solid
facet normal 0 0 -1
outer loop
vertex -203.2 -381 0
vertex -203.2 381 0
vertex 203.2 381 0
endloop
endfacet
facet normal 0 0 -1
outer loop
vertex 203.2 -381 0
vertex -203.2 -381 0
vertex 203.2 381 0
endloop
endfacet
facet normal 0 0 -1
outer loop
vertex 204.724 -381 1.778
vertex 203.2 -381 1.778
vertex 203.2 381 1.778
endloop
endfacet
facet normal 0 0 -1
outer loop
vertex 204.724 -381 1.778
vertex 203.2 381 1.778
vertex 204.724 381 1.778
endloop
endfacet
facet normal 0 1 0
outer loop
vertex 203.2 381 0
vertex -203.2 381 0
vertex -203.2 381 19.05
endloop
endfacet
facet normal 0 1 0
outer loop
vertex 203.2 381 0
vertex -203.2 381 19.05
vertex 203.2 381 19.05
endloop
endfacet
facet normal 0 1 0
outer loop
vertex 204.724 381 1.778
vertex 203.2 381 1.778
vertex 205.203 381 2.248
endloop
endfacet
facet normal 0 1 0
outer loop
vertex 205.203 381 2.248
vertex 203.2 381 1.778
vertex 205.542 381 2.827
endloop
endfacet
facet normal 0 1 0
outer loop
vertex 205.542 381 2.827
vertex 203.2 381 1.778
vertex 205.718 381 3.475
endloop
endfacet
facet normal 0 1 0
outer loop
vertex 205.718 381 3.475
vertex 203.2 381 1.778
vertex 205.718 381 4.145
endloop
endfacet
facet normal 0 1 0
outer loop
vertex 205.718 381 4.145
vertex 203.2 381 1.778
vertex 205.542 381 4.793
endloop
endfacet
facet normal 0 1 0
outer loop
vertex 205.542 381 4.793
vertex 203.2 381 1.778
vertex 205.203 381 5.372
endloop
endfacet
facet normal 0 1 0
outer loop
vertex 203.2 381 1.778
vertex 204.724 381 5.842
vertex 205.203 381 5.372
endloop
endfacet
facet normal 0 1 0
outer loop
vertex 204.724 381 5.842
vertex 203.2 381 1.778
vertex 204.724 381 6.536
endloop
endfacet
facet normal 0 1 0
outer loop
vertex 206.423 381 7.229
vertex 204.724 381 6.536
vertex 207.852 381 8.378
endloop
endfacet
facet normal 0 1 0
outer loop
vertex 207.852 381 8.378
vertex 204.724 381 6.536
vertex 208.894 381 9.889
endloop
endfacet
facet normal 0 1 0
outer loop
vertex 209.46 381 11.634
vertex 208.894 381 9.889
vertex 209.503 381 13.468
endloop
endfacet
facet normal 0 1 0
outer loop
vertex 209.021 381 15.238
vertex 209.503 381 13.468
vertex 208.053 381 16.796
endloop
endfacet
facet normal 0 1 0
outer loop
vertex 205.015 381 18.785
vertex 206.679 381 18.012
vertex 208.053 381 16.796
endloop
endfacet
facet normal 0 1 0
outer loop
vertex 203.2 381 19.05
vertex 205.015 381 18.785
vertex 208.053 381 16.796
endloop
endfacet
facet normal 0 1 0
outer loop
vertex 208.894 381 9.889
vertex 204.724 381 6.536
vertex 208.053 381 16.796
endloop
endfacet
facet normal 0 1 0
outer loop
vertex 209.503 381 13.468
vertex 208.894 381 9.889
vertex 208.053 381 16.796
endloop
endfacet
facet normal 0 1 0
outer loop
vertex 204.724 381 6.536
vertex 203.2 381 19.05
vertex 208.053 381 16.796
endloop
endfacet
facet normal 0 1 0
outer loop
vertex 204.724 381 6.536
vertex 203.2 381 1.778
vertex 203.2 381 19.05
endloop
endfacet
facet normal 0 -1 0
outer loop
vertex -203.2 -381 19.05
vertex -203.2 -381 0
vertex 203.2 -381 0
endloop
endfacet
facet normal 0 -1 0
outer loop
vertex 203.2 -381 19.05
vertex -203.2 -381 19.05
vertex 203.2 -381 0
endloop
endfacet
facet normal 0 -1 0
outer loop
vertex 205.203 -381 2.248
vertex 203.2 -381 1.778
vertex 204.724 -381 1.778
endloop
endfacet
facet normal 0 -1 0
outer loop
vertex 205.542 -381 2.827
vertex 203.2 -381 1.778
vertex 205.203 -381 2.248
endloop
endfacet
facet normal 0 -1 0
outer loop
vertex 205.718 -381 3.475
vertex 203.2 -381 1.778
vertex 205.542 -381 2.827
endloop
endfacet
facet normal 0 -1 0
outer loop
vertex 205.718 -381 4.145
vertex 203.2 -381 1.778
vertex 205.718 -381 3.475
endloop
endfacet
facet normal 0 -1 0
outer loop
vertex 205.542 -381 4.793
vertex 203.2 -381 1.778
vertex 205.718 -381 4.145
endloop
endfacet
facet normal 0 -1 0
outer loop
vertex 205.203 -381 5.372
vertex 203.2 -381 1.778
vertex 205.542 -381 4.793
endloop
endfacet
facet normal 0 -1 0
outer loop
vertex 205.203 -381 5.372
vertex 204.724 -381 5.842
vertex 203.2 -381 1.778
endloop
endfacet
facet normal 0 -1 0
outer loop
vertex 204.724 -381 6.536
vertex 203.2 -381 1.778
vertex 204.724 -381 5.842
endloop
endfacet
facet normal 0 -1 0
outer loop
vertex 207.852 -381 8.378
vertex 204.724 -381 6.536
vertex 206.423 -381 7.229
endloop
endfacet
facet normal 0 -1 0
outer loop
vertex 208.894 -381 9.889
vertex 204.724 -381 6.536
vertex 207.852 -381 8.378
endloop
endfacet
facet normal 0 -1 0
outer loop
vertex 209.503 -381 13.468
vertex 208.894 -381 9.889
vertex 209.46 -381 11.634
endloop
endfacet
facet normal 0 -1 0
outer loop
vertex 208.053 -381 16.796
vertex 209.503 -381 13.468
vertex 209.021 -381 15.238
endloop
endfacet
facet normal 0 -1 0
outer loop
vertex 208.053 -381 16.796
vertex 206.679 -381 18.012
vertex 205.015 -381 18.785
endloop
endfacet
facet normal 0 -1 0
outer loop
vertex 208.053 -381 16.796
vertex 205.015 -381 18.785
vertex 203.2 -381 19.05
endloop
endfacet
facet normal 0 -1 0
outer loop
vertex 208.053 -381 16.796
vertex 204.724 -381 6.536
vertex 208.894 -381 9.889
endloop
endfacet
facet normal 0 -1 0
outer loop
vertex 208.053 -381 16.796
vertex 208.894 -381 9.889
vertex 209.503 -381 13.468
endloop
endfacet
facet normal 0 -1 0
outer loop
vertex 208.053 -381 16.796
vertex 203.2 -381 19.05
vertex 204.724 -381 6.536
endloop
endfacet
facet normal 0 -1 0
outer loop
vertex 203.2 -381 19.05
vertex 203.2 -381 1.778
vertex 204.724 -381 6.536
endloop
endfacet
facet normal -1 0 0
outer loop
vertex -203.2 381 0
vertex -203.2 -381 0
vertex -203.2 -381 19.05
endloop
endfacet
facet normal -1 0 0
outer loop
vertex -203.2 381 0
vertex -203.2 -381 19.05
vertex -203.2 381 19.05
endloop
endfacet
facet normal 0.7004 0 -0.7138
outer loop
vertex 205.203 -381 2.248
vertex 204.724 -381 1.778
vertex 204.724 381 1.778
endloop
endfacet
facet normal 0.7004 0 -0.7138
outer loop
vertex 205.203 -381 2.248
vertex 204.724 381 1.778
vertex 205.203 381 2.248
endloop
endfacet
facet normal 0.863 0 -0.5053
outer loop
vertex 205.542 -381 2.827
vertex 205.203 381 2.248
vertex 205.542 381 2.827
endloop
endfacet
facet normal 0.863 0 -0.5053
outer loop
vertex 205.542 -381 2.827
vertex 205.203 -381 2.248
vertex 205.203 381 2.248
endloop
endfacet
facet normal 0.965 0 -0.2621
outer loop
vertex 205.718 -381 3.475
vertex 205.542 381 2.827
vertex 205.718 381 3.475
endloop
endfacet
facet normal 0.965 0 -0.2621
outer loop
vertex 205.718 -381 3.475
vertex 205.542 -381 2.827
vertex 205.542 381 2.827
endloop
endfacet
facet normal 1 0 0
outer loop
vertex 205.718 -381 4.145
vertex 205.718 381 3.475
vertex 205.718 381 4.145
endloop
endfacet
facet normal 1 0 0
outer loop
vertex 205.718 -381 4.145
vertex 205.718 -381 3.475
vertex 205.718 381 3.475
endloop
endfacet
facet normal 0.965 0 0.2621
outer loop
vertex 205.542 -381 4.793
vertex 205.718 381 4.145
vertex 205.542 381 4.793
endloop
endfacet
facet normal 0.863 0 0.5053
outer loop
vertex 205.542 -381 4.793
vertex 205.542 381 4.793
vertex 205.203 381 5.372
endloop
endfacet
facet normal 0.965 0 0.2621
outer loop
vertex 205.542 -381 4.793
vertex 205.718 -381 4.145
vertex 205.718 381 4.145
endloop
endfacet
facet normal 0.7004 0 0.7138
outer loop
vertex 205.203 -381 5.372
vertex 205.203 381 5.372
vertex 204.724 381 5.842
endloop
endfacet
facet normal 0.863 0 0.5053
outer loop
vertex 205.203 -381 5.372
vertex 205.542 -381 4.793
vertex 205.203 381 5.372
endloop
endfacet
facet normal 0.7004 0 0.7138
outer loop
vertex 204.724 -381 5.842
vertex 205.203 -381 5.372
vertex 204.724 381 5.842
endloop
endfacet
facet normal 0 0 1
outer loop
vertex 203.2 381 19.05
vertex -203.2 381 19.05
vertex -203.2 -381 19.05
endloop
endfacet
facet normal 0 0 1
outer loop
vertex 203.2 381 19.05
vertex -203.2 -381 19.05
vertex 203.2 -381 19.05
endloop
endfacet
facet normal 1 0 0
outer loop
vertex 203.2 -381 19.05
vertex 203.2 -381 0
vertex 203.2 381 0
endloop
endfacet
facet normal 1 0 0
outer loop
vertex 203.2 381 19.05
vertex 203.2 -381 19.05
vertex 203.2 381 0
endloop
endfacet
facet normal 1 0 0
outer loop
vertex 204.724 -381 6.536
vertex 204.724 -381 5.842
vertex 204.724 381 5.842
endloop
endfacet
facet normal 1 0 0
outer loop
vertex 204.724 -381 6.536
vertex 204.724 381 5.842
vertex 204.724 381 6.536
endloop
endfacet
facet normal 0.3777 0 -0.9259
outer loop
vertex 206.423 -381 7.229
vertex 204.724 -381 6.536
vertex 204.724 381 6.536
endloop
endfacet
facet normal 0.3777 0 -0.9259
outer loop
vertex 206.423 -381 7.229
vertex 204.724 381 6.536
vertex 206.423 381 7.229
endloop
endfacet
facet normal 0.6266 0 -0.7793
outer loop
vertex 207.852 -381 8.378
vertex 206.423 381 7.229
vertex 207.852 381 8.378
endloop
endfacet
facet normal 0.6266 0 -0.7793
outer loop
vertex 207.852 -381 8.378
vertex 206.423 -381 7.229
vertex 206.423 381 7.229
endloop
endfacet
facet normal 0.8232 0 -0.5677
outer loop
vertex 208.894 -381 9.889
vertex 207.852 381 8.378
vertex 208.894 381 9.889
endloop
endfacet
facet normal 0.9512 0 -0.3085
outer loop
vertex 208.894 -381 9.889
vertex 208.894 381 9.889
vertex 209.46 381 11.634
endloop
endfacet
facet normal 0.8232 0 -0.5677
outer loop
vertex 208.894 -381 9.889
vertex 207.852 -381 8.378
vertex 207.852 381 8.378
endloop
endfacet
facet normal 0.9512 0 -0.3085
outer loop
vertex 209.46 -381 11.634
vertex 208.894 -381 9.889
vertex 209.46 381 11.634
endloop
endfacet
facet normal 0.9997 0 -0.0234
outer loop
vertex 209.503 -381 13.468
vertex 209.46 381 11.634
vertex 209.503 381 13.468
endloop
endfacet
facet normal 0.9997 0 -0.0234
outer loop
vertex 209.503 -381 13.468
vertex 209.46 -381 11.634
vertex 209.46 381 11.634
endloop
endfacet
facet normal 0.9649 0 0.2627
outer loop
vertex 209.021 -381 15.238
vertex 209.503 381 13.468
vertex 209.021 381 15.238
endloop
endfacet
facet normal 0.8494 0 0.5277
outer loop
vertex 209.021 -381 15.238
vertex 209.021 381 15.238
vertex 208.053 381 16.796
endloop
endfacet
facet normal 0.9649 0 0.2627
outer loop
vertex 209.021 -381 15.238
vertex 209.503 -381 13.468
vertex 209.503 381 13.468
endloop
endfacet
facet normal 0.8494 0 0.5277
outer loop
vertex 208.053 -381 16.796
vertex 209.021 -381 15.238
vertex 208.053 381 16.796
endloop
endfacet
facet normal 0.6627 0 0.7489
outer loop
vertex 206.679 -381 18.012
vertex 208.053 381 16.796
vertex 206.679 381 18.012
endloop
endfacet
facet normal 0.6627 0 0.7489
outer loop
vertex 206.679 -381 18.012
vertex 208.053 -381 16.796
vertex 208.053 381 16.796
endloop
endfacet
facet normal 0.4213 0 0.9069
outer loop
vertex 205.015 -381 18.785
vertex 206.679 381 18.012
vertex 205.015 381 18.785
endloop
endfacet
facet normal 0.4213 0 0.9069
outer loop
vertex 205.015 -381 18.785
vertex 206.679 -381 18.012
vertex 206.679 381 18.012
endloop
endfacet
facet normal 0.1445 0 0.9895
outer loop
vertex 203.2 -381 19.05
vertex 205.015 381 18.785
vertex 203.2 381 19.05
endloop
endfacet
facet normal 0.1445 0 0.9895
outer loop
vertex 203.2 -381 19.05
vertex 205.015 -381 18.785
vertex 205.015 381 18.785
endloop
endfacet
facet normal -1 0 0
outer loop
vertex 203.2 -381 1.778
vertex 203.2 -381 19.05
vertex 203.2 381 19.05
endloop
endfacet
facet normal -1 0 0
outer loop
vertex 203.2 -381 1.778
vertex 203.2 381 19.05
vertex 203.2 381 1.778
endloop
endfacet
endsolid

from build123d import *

# Parameters (mm, degrees)
F0_W     = 406.4
F0_H     = 762
F1_DEPTH = 19.05
F3_DEPTH = 762


with BuildPart() as f1:
    # F0 (on Top) → F1 (new body)
    with BuildSketch(Plane.XY):
        Rectangle(F0_W, F0_H)
    extrude(amount=F1_DEPTH)


with BuildPart() as f3:
    # F2 (on face) → F3 (new body, through all)
    with BuildSketch(Plane.XZ.offset(381)):
        with BuildLine():
            Line((204.724, 5.842), (204.724, 6.535592))
            ThreePointArc((204.724, 6.535592), (209.503431, 13.46763), (203.2, 19.05))
            Line((203.2, 19.05), (203.2, 1.778))
            Line((203.2, 1.778), (204.724, 1.778))
            Line((204.724, 1.778), (204.724, 5.842))
        make_face()
        with BuildLine():
            ThreePointArc((204.724, 1.778), (205.74, 3.81), (204.724, 5.842))
            Line((204.724, 5.842), (204.724, 1.778))
        make_face()
    extrude(amount=-F3_DEPTH)


solid = Compound([f1.part, f3.part])
